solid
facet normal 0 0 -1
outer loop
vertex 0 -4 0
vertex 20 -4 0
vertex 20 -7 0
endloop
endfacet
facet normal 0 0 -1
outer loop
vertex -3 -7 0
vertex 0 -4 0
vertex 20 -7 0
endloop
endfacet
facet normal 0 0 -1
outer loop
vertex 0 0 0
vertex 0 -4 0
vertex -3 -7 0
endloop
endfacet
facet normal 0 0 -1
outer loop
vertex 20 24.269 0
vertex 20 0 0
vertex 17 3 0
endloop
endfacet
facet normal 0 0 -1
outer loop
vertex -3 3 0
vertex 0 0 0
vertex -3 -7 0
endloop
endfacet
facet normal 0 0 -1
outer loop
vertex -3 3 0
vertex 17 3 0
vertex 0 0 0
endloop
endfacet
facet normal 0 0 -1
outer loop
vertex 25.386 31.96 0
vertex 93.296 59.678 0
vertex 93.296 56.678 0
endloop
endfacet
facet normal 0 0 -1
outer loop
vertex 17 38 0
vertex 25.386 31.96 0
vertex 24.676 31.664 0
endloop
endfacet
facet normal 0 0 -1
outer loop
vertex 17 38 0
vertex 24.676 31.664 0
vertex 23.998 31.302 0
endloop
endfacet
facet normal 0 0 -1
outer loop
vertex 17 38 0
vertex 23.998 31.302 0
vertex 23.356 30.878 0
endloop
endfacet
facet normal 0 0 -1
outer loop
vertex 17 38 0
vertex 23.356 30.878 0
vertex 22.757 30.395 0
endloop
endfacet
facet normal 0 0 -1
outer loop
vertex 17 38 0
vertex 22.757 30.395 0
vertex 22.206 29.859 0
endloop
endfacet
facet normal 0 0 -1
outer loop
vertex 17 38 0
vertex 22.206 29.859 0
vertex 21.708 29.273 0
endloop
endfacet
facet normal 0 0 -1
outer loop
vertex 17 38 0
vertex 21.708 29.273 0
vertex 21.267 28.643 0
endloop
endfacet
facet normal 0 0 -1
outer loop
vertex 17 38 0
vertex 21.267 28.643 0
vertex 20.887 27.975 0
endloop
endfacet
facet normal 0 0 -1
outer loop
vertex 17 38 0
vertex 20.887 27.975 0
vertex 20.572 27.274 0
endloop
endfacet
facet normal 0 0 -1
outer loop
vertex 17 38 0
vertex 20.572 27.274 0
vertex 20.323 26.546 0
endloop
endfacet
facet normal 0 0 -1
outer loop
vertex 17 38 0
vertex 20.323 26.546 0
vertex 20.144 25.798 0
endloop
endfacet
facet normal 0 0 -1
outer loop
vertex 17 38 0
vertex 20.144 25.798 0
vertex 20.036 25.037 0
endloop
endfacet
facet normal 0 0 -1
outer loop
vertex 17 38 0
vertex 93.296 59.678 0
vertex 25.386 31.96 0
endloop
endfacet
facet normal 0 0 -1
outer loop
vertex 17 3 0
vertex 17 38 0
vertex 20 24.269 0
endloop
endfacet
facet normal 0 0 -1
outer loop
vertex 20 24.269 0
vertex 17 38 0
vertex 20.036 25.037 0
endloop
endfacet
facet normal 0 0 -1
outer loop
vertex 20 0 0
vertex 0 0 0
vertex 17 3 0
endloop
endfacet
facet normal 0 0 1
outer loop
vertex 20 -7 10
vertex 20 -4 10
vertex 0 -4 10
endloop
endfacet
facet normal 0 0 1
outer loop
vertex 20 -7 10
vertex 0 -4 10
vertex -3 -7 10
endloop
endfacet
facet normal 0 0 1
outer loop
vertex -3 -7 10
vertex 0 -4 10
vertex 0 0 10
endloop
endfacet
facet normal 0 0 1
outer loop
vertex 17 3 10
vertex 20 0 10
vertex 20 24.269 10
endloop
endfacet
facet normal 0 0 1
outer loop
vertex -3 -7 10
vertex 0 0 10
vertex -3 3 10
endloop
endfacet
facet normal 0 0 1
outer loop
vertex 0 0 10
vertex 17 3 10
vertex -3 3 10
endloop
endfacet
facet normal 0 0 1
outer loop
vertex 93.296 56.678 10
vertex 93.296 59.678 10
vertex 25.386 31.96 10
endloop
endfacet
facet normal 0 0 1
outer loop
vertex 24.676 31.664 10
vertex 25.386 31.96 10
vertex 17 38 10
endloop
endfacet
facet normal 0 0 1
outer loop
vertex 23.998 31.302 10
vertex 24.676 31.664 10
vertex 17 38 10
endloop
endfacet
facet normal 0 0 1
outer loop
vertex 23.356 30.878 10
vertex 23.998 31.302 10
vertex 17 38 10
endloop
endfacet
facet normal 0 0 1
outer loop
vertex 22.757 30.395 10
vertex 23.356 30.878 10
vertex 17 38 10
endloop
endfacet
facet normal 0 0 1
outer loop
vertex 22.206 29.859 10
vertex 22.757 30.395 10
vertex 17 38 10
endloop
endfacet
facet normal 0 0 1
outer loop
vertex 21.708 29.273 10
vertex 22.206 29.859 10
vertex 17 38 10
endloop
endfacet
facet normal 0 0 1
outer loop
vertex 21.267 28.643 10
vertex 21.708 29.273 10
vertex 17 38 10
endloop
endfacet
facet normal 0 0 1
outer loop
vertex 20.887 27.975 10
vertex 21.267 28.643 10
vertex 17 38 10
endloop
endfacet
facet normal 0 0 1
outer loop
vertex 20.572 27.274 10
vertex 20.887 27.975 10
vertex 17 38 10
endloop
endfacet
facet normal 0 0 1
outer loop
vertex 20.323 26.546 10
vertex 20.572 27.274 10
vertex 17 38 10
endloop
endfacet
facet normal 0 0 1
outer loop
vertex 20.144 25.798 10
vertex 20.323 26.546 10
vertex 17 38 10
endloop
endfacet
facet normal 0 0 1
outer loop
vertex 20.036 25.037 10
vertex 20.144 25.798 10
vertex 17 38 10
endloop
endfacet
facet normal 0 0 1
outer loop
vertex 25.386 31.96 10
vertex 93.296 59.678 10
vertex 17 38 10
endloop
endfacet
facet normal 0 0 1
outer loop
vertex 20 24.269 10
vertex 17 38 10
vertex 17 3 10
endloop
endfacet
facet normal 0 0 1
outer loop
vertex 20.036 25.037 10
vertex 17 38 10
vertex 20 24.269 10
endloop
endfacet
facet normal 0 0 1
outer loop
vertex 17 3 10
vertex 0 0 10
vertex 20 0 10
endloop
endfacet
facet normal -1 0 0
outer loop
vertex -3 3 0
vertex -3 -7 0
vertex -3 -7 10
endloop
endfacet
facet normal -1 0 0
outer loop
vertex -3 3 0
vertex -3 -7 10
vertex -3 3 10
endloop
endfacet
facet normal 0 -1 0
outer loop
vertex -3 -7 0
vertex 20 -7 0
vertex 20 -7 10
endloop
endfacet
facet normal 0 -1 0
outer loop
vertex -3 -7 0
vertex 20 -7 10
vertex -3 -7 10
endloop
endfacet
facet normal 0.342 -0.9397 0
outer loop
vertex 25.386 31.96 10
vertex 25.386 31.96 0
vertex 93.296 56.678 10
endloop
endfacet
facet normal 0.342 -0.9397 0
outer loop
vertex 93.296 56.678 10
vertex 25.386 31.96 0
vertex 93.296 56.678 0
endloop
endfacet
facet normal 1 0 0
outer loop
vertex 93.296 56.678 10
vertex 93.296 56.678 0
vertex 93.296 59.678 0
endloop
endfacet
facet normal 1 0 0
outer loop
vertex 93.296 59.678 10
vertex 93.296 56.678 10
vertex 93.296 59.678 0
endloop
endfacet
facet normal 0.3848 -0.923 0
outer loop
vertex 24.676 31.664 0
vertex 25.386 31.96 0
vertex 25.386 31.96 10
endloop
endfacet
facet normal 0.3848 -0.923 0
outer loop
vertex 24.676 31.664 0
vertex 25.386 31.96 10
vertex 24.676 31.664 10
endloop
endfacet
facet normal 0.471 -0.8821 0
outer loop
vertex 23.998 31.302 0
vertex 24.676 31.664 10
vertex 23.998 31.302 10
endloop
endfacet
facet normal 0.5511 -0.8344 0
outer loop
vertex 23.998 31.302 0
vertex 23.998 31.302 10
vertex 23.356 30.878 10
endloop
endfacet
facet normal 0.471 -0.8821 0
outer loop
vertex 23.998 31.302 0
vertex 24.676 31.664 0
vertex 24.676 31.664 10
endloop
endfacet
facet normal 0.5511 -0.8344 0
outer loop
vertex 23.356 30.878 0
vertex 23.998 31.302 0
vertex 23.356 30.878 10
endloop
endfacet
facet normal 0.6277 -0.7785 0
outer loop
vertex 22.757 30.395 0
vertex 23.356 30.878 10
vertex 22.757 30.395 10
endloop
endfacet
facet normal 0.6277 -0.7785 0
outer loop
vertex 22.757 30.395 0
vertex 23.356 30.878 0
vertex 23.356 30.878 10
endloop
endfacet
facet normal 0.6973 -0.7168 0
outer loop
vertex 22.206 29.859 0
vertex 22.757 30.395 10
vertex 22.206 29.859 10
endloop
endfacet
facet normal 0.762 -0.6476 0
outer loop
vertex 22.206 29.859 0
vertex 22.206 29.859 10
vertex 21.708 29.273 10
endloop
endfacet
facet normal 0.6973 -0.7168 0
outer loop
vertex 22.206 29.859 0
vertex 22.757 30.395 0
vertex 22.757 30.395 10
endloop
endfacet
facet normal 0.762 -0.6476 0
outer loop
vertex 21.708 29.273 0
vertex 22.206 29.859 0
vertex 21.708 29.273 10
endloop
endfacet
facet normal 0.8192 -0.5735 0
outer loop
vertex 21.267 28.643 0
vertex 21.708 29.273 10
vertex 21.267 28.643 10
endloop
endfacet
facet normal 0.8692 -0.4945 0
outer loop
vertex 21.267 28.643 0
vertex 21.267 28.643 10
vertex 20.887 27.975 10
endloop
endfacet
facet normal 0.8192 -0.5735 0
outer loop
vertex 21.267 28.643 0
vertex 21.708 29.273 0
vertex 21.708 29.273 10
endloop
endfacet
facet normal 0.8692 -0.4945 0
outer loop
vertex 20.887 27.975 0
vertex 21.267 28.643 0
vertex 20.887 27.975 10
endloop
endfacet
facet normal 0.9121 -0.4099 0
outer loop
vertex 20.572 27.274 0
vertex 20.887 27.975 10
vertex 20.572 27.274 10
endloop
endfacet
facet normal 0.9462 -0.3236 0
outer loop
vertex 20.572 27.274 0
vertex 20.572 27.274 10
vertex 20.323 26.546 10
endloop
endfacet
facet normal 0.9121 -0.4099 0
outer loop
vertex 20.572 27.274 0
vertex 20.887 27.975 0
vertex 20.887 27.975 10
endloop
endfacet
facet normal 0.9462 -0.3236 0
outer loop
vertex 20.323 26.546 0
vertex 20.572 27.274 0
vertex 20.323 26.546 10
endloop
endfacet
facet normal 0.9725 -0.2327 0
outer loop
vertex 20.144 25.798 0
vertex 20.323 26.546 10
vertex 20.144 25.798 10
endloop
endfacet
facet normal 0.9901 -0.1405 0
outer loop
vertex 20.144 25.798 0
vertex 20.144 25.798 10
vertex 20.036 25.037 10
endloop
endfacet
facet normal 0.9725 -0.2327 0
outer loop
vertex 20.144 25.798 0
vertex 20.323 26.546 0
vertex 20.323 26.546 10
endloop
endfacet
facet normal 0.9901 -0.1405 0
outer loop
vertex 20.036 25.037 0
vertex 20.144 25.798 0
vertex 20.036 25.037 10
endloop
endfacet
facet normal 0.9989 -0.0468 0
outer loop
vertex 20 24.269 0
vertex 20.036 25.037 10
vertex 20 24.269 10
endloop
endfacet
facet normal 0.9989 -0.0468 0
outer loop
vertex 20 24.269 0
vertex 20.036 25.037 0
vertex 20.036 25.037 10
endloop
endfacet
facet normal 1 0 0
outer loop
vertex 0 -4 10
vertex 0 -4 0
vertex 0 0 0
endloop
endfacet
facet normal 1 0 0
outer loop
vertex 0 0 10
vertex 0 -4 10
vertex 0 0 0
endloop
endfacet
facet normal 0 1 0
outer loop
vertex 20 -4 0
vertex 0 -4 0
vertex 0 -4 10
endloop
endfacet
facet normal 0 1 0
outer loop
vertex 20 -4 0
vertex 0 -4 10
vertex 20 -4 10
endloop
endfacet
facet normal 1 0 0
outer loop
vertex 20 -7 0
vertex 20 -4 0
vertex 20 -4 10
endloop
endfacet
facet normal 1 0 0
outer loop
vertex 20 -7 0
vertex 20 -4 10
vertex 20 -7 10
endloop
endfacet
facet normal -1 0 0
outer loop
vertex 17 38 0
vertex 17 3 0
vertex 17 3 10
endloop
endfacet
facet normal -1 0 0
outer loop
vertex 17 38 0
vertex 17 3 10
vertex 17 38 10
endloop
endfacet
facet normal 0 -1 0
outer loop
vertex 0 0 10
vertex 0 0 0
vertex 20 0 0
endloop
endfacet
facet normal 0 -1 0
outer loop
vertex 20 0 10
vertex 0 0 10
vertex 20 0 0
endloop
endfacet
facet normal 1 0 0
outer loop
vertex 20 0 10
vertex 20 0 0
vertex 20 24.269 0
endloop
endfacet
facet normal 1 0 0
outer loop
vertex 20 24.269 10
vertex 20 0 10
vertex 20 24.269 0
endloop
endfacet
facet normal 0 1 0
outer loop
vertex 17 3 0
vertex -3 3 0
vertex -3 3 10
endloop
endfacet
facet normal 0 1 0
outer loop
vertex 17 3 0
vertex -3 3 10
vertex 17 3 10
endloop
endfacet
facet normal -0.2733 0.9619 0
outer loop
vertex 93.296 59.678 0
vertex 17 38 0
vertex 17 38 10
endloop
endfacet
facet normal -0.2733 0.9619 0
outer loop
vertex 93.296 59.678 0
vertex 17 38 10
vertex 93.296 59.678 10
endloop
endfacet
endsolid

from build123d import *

# Parameters (mm, degrees)
PAD_DEPTH = 10


with BuildPart() as part:
    # Sketch → Pad (new body)
    with BuildSketch(Plane.XY):
        with BuildLine():
            Line((0, -4), (20, -4))
            Line((20, -4), (20, -7))
            Line((20, -7), (-3, -7))
            Line((-3, -7), (-3, 3))
            Line((-3, 3), (17, 3))
            Line((17, 3), (17, 38))
            Line((17, 38), (93.296024, 59.677571))
            Line((93.296024, 56.677571), (93.296024, 59.677571))
            Line((25.385638, 31.960212), (93.296024, 56.677571))
            ThreePointArc((25.385638, 31.960212), (21.480261, 28.96351), (20, 24.268723))
            Line((20, 0), (20, 24.268723))
            Line((0, 0), (20, 0))
            Line((0, -4), (0, 0))
        make_face()
    extrude(amount=PAD_DEPTH)


solid = part.part
